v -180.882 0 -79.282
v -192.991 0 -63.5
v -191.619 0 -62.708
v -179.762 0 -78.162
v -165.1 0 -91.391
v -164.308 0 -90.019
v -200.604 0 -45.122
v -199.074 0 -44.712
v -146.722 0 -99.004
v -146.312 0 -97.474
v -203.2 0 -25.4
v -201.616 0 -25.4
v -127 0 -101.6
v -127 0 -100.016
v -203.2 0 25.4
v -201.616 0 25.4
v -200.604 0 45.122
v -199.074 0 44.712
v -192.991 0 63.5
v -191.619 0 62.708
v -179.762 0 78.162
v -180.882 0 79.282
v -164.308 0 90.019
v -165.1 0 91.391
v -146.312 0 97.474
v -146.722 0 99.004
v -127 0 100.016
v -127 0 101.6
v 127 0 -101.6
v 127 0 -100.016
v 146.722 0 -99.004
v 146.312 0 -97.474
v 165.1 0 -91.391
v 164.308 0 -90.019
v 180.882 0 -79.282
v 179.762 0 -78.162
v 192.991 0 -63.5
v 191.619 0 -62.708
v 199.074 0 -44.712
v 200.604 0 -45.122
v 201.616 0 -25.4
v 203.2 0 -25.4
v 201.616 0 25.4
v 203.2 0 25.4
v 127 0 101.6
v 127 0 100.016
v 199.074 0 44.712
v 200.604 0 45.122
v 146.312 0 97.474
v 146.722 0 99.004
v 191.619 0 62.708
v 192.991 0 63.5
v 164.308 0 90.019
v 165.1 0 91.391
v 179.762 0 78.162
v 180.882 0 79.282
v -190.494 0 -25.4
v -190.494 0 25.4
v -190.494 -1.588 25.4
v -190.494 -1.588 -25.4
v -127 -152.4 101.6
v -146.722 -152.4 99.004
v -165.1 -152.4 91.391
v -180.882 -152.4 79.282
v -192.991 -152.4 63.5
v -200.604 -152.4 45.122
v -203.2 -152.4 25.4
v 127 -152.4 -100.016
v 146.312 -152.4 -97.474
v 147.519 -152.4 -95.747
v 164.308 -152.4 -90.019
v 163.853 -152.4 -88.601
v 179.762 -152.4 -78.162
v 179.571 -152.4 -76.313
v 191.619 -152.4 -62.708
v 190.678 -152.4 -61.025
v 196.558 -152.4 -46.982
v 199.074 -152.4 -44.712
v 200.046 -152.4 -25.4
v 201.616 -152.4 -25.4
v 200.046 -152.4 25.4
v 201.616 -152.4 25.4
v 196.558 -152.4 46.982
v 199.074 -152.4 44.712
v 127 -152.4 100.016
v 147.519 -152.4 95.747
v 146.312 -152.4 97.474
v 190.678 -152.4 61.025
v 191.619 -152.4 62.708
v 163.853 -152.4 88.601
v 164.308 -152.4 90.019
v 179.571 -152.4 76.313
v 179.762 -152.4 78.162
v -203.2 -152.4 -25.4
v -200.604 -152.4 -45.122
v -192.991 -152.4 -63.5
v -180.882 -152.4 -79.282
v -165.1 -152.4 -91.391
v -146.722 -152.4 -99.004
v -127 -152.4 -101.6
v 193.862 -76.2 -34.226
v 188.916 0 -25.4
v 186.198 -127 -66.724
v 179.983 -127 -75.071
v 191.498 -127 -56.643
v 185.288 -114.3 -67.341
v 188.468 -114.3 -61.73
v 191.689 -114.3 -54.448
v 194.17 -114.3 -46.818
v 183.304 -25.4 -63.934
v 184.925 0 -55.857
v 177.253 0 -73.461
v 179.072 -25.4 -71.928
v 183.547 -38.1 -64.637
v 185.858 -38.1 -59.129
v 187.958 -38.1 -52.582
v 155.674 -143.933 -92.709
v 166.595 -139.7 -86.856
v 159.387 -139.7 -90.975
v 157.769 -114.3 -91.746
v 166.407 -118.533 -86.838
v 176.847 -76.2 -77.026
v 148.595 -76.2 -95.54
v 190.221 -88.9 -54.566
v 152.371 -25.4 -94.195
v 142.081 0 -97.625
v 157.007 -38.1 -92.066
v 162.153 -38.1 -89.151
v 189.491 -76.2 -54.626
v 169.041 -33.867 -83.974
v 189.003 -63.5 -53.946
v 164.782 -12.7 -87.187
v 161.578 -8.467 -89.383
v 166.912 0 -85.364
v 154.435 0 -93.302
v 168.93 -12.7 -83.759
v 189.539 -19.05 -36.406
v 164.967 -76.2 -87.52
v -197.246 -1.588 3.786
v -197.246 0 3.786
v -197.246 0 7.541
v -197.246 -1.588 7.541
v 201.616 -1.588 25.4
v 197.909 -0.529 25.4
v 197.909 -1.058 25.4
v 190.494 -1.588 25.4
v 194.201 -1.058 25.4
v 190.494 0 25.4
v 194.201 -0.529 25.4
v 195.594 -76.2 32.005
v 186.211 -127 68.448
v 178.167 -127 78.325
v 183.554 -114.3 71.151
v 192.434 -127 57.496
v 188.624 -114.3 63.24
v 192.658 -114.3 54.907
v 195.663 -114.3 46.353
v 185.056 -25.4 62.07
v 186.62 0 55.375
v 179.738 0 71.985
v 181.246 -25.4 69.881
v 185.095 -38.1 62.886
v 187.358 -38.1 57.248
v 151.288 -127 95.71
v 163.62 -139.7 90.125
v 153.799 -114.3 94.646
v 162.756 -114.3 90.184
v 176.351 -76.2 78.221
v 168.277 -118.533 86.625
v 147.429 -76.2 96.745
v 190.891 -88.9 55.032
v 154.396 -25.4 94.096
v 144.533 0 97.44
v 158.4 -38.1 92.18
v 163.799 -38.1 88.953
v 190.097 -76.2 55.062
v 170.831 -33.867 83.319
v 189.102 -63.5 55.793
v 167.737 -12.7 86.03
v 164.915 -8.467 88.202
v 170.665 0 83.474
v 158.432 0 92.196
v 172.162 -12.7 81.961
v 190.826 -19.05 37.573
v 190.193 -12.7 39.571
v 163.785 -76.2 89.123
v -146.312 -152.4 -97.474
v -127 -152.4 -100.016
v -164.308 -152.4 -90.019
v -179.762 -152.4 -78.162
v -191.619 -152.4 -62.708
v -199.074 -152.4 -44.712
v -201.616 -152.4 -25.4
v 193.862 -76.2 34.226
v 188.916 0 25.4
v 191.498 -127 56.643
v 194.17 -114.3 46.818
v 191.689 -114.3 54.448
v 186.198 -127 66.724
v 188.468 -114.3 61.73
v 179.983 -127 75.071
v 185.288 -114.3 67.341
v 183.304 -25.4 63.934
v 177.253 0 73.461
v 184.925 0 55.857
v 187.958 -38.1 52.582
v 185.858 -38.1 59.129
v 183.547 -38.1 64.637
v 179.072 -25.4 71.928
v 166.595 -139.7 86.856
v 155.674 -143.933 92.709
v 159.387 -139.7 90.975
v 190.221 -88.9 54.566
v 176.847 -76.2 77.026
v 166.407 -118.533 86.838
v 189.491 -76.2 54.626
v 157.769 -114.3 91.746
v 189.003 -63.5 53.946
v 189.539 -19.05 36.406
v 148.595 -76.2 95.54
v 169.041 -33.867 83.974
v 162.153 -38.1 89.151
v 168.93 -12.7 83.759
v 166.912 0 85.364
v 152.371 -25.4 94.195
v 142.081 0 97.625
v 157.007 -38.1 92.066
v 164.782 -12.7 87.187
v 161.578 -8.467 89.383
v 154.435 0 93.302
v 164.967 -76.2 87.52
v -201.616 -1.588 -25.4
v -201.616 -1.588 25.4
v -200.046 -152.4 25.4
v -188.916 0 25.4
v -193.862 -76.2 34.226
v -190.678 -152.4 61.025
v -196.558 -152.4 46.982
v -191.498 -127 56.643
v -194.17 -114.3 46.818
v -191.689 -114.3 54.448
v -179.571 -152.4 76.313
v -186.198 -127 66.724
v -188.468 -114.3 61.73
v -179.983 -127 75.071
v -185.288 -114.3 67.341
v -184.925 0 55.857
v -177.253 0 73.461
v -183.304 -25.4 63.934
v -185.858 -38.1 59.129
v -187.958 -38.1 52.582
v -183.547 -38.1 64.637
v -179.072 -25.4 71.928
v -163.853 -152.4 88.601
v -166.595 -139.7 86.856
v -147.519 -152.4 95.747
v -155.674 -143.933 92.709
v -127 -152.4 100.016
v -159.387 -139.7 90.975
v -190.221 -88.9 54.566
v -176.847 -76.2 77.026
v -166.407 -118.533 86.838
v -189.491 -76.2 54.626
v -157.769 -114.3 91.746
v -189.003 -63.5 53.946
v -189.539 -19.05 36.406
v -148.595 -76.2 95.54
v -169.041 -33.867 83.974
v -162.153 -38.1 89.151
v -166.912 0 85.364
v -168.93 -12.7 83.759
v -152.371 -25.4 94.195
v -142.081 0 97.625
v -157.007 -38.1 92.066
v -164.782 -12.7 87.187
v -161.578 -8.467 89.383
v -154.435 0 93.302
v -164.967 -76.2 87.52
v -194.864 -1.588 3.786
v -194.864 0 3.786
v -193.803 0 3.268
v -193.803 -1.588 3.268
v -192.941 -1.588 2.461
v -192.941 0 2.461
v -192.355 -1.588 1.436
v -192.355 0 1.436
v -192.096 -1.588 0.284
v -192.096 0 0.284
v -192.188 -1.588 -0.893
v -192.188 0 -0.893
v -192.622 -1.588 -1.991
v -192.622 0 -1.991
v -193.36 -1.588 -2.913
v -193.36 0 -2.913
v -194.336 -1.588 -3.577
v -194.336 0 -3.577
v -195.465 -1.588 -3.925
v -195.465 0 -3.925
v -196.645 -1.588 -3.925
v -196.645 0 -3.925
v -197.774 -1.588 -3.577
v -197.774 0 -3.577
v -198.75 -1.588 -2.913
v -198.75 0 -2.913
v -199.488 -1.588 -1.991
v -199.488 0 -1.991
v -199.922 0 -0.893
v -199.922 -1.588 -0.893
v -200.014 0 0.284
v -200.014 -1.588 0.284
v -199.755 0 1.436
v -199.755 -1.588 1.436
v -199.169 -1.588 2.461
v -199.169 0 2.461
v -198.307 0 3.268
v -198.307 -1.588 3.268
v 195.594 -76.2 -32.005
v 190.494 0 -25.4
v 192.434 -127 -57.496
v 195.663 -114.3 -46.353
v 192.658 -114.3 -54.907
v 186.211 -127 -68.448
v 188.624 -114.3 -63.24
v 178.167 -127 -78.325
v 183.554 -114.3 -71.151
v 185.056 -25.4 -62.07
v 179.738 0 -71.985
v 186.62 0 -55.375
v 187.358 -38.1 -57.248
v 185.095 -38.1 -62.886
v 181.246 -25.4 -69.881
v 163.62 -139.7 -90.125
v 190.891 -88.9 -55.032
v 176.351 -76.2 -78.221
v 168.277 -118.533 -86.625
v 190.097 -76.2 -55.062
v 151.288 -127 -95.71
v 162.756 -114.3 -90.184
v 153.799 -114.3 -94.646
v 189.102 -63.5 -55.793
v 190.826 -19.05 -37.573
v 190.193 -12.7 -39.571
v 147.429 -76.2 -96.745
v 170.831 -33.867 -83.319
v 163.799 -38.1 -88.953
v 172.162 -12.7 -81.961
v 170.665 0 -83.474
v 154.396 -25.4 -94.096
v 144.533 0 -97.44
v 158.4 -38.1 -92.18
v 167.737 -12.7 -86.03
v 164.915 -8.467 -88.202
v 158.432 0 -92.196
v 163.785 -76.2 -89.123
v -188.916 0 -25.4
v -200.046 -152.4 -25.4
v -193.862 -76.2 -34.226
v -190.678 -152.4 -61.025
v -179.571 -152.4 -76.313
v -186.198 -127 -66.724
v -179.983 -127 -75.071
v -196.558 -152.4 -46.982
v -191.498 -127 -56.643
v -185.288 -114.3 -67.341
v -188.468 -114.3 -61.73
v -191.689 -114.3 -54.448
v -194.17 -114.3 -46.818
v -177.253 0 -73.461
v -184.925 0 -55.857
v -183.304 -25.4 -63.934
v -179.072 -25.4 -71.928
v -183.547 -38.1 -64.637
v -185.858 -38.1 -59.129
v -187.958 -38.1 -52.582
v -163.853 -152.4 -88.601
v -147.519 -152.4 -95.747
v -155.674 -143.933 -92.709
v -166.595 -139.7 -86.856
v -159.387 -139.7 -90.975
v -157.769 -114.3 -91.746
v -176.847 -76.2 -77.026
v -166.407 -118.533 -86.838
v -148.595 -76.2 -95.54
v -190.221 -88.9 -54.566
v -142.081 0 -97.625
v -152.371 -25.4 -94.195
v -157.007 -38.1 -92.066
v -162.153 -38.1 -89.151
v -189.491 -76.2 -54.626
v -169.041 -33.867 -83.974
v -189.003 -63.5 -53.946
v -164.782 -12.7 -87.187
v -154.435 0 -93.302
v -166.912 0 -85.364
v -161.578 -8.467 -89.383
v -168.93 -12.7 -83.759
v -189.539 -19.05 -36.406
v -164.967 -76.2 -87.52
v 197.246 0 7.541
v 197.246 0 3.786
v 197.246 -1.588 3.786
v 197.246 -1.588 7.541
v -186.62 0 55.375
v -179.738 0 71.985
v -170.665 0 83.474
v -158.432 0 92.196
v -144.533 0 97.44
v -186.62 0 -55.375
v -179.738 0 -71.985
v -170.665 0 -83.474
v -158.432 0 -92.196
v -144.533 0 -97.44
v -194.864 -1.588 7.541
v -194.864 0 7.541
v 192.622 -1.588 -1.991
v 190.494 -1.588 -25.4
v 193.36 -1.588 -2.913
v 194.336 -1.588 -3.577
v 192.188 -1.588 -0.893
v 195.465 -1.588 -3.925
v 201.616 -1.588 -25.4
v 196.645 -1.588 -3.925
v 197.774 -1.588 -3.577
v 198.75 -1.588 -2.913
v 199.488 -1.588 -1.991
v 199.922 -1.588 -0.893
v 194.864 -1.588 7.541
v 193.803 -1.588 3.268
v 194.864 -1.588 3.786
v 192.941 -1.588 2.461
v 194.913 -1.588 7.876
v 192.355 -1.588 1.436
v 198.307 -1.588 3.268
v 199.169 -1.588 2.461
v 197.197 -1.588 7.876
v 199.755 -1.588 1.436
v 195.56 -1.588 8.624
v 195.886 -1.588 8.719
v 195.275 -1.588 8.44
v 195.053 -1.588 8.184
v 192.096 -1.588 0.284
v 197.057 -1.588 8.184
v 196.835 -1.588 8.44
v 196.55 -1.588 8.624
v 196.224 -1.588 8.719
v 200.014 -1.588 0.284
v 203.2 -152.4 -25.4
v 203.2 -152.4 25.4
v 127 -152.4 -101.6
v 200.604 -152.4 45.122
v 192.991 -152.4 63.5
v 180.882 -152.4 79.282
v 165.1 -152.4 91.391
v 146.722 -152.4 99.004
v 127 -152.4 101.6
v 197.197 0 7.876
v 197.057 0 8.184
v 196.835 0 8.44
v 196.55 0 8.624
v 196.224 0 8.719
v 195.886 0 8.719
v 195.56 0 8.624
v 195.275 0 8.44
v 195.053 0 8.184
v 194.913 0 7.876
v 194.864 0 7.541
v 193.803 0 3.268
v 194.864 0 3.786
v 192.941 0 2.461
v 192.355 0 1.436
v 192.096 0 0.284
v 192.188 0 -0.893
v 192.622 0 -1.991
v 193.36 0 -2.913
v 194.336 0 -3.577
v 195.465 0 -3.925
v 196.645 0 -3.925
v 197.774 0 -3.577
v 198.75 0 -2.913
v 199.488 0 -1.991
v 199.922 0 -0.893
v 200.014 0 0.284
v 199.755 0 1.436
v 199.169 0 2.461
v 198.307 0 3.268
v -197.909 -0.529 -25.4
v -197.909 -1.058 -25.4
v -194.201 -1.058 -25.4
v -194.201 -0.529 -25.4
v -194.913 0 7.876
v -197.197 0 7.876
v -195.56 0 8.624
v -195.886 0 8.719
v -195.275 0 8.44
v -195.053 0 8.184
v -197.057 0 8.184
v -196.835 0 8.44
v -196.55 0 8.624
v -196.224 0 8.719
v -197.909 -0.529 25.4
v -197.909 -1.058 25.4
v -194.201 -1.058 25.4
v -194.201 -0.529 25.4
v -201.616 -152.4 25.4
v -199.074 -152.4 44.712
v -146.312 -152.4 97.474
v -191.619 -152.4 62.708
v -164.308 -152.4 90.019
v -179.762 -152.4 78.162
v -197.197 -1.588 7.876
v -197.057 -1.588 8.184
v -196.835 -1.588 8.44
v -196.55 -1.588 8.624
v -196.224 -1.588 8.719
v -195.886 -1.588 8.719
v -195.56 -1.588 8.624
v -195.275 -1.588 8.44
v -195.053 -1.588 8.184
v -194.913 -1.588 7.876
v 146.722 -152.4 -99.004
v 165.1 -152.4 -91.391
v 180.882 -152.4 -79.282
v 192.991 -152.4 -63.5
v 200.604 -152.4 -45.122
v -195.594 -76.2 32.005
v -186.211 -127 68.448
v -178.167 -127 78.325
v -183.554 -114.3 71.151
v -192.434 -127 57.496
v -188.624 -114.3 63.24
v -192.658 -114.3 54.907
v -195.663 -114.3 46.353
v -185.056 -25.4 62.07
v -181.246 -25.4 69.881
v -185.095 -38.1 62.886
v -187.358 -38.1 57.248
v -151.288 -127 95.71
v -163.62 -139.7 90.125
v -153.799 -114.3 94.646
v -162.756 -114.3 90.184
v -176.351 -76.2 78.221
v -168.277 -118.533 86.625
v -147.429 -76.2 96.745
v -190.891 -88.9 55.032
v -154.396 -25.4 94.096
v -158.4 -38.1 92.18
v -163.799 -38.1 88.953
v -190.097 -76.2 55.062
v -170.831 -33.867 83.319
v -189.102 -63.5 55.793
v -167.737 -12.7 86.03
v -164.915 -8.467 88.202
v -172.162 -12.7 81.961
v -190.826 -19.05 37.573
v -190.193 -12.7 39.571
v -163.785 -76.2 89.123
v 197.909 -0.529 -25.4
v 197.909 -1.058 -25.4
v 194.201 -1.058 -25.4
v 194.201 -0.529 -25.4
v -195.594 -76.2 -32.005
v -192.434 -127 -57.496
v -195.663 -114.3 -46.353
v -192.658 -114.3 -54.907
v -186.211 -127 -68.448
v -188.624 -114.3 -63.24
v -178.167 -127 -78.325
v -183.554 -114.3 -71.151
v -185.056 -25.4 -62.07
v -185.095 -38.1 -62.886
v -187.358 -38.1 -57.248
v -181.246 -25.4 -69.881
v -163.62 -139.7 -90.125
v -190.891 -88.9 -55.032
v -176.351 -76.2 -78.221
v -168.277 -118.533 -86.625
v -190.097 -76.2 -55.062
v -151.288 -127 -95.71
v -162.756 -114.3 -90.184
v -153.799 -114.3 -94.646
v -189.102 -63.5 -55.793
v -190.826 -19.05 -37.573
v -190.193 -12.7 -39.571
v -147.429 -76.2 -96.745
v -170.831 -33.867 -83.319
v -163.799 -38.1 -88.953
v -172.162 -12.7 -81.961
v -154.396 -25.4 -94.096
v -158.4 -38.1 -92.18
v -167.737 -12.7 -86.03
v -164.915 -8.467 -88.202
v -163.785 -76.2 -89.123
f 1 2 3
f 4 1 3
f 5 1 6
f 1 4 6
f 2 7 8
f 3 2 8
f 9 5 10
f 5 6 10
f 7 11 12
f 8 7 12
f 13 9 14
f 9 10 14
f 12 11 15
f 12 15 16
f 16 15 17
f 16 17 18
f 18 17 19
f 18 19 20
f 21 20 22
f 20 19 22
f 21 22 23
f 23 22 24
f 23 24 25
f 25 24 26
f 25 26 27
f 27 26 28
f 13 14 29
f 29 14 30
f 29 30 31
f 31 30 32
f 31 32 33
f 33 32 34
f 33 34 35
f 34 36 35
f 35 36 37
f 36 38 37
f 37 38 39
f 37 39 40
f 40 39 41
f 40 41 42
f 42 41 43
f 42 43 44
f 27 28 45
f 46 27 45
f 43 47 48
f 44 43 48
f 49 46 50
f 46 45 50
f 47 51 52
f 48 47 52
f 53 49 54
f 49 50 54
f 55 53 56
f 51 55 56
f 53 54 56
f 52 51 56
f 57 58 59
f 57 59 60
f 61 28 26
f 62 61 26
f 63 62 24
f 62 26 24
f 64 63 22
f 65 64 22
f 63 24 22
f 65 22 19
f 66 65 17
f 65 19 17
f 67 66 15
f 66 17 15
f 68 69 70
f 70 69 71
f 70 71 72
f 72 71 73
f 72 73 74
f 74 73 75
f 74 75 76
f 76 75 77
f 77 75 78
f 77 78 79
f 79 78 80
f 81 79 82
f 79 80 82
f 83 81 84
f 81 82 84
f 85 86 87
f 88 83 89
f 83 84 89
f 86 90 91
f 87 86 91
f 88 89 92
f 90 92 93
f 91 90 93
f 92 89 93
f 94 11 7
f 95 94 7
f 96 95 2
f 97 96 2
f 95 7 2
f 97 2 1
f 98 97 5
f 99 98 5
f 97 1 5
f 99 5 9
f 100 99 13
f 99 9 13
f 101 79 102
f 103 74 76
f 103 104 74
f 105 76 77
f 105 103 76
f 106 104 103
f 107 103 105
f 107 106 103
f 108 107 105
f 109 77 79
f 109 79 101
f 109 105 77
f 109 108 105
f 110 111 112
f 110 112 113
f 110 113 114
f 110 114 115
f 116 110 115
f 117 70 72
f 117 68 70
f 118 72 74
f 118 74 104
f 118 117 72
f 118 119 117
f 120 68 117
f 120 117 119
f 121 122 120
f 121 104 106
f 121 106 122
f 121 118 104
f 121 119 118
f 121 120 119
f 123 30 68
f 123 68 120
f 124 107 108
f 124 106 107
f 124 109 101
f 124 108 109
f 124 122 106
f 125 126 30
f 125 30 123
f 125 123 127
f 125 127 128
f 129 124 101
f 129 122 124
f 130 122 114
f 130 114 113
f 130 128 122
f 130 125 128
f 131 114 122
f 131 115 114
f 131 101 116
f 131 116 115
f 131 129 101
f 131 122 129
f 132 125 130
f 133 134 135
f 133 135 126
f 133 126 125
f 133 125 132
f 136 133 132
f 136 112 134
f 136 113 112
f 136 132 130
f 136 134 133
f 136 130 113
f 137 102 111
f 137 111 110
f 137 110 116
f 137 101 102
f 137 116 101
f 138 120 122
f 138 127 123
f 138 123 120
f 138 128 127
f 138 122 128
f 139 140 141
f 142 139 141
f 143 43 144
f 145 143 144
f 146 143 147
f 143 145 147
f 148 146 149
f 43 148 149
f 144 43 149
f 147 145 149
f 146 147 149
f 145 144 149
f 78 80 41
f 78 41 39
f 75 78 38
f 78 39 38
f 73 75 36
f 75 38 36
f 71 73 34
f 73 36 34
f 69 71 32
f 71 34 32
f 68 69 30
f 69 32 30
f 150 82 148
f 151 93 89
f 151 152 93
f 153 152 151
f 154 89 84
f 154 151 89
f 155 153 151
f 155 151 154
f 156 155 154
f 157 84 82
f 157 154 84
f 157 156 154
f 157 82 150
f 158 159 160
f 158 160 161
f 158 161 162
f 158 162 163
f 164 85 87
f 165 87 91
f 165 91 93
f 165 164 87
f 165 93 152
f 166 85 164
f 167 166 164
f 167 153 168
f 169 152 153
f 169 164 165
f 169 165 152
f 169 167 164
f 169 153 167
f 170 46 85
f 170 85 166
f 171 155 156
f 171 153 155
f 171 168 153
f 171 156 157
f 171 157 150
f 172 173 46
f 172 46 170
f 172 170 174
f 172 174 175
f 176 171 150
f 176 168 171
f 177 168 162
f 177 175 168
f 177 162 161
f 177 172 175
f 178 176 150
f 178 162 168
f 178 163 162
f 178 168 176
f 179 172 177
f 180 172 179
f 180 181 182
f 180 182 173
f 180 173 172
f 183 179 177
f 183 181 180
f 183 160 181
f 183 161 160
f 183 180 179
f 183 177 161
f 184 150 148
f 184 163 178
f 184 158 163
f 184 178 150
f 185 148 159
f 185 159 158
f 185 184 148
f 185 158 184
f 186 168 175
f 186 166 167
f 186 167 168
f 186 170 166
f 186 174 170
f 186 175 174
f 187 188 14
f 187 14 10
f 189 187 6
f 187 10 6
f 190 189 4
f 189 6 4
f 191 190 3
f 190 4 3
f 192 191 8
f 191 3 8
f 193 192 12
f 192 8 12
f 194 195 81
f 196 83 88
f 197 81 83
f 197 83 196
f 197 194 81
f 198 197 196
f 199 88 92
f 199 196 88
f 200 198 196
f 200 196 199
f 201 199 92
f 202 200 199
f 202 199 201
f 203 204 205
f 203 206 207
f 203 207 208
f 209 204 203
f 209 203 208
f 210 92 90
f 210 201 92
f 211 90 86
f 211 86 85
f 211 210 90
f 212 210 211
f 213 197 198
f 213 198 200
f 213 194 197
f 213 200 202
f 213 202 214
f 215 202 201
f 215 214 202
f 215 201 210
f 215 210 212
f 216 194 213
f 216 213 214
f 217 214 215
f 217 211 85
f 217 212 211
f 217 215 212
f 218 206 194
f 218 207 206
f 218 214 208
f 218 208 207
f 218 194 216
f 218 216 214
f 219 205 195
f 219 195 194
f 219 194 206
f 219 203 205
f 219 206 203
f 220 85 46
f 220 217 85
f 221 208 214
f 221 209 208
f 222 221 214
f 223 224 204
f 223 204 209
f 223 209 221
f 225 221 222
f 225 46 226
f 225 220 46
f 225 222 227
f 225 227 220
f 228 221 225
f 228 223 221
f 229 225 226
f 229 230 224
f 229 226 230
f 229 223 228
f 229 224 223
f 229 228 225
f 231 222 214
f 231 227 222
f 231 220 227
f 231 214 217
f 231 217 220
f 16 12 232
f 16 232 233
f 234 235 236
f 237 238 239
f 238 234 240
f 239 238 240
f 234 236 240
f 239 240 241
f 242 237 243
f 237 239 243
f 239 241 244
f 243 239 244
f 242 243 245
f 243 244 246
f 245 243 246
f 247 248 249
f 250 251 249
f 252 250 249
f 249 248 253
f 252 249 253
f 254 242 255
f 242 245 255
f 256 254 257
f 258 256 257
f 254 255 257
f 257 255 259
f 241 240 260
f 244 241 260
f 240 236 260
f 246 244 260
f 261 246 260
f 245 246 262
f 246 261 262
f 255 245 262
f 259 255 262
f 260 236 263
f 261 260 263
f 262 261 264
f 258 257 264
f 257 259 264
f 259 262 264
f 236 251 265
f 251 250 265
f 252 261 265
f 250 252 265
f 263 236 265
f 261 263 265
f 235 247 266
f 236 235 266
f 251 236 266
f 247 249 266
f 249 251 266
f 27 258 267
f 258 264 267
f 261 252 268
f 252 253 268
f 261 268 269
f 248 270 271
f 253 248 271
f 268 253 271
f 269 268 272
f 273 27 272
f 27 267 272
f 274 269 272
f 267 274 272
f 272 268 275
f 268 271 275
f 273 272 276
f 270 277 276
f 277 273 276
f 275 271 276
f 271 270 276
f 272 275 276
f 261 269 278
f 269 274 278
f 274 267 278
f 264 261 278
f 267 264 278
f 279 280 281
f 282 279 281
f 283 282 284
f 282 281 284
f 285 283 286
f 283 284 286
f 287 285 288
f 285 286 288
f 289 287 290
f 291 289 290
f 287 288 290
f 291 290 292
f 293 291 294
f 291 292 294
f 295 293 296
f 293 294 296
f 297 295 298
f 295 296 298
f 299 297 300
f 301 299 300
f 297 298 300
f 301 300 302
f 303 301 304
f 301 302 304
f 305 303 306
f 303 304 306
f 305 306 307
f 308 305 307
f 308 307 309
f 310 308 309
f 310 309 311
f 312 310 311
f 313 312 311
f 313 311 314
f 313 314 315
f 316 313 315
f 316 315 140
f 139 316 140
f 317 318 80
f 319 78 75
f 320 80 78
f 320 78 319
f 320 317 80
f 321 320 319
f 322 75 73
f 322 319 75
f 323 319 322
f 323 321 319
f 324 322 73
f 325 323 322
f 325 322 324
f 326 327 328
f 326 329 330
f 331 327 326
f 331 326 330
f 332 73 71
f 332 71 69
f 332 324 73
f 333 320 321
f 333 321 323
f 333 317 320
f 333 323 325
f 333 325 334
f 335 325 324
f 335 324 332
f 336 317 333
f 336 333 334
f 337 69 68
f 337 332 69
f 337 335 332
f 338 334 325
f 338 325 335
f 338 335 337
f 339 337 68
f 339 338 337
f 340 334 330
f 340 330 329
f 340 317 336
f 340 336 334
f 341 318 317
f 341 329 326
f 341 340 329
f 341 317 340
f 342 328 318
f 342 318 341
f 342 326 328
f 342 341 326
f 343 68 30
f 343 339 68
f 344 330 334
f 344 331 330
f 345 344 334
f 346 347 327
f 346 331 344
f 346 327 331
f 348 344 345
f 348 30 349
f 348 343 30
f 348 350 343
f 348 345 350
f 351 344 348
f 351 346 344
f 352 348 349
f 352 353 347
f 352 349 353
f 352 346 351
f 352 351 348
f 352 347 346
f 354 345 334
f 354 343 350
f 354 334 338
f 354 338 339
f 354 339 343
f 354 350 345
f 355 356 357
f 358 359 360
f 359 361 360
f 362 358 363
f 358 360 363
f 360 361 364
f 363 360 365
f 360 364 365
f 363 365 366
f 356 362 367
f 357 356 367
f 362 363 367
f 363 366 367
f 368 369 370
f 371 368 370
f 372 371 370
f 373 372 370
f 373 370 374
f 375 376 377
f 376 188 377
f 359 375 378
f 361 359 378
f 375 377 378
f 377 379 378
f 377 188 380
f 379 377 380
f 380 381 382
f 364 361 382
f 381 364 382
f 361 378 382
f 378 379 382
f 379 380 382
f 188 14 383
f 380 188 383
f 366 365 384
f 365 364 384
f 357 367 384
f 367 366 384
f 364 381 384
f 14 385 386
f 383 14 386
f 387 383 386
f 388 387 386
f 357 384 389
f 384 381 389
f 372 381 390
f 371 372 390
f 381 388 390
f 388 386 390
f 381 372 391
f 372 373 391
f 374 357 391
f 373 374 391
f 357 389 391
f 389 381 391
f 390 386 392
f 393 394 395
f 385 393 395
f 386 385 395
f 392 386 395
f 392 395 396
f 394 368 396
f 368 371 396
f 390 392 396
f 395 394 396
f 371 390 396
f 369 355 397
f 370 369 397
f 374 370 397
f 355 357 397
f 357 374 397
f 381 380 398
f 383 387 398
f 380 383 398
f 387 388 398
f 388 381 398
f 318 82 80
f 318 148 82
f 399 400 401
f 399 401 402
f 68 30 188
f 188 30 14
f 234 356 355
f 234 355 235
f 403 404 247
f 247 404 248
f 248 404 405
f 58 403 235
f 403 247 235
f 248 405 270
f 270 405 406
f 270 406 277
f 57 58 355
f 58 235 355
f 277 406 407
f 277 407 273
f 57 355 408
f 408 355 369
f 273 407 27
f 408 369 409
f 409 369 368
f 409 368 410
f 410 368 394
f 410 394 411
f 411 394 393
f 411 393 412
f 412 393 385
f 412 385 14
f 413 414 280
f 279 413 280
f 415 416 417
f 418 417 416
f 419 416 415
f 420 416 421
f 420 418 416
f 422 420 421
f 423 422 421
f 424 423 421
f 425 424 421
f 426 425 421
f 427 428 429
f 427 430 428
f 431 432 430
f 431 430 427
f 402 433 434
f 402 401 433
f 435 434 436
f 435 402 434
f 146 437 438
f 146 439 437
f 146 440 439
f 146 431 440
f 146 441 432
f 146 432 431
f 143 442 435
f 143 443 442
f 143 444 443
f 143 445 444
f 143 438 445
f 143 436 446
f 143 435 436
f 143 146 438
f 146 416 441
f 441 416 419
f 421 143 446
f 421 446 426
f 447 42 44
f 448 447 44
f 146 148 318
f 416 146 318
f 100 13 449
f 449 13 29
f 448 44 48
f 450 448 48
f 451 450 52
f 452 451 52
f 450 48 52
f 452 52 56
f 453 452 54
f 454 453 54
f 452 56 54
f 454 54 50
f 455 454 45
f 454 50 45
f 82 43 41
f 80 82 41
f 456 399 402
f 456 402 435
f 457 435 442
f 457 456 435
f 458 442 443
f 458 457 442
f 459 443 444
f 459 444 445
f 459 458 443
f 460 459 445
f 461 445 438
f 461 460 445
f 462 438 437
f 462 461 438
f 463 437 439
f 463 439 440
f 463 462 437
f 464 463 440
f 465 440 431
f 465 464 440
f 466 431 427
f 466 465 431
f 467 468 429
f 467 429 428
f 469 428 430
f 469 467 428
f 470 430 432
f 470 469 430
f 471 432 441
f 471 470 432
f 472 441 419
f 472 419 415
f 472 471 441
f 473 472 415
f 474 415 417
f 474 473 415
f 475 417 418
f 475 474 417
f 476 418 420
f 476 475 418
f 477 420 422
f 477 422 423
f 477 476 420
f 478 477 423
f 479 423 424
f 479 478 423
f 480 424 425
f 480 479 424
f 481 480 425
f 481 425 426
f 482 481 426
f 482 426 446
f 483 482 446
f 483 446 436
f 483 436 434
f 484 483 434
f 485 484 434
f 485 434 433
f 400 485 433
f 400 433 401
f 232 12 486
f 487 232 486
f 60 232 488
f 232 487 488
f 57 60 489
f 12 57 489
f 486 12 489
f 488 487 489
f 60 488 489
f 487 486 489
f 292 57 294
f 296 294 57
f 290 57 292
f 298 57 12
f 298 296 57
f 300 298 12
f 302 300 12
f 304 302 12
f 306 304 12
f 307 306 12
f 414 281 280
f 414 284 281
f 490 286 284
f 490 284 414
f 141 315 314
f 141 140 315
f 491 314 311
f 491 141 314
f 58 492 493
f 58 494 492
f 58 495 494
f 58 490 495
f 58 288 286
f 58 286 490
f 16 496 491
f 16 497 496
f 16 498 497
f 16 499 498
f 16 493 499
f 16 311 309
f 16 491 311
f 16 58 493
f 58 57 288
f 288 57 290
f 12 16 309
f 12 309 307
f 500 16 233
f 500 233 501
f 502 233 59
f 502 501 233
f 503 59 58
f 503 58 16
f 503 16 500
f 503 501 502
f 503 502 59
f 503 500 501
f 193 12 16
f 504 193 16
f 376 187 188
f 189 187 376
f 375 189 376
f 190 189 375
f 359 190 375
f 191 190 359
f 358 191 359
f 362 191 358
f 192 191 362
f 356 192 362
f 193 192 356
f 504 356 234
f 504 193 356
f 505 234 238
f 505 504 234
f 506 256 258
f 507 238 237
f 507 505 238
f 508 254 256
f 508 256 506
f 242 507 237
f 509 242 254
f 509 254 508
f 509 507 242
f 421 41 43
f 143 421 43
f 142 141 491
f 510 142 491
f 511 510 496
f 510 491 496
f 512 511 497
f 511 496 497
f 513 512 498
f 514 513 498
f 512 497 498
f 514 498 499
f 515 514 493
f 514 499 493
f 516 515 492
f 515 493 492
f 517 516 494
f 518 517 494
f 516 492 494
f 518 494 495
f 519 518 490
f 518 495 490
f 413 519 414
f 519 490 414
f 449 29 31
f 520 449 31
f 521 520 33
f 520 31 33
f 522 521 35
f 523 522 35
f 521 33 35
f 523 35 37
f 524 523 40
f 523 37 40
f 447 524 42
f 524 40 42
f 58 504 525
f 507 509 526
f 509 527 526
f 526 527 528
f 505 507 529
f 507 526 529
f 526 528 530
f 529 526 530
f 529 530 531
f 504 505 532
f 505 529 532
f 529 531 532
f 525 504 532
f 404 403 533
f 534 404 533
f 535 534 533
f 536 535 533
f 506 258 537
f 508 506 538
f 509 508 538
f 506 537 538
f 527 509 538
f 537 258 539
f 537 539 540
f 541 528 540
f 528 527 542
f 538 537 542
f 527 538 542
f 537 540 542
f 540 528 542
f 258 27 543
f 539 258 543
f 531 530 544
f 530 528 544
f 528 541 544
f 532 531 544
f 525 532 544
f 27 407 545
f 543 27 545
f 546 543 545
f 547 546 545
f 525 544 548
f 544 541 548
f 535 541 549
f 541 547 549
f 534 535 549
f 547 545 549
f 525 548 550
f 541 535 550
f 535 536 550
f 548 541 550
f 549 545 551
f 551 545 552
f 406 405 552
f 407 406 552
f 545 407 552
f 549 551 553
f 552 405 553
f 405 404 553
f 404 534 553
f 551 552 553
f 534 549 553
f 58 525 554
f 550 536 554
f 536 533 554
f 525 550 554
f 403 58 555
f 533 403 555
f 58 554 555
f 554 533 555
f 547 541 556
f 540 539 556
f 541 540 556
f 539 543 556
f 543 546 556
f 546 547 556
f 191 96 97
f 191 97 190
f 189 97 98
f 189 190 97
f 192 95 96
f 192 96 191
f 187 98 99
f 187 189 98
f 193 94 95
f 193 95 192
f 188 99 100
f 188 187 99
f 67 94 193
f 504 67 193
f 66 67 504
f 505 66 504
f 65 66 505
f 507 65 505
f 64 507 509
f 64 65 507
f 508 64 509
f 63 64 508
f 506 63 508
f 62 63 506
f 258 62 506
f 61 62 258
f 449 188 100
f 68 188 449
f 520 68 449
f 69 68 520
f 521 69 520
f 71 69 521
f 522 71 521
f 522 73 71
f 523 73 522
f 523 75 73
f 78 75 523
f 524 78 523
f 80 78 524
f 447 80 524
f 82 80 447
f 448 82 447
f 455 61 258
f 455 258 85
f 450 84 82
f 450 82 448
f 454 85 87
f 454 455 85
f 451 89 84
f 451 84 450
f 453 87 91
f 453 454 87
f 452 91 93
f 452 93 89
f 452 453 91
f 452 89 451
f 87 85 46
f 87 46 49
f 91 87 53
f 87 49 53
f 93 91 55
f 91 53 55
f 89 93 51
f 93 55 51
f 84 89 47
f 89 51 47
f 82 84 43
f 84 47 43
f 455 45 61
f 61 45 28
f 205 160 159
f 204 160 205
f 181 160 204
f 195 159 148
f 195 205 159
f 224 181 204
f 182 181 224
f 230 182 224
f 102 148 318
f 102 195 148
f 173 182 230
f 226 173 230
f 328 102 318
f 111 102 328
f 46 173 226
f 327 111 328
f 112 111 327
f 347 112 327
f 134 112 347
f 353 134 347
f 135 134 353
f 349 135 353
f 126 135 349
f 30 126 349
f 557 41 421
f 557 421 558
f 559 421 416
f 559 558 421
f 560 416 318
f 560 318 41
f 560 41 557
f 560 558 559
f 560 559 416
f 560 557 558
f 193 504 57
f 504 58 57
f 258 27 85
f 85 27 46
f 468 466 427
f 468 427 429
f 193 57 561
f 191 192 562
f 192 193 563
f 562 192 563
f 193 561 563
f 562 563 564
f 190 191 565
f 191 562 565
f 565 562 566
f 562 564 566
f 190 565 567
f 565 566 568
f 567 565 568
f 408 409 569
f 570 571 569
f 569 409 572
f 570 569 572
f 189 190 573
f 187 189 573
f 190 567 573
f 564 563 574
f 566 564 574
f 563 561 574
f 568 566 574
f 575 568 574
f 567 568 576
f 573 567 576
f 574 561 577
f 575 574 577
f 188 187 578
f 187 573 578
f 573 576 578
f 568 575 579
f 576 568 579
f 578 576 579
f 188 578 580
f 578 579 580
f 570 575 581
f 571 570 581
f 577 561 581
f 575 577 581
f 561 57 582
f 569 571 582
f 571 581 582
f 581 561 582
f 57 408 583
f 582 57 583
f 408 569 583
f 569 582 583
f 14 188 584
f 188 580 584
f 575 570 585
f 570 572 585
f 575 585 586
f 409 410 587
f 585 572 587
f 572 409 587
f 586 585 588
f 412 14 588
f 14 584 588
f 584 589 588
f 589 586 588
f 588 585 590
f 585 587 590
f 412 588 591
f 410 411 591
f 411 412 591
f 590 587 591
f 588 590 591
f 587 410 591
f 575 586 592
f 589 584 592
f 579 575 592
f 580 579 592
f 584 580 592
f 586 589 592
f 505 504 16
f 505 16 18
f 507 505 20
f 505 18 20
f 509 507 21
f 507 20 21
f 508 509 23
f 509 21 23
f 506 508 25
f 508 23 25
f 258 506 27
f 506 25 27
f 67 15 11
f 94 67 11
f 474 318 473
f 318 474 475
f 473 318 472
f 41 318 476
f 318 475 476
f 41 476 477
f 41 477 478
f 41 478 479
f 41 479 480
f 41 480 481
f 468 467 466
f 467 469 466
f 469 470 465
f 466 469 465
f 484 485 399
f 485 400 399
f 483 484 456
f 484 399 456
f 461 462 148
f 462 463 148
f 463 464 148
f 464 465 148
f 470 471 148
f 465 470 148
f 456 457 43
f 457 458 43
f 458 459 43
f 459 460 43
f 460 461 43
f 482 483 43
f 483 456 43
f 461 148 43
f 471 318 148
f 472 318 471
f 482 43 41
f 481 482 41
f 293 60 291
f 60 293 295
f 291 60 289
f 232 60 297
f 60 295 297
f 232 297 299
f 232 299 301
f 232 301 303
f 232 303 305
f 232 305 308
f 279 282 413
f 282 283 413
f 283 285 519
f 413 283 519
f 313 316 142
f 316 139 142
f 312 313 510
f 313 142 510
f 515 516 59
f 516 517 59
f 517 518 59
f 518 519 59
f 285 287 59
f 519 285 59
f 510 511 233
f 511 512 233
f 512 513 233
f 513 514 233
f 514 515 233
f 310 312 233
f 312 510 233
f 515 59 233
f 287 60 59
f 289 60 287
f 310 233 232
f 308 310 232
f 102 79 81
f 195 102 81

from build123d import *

# Parameters (mm, degrees)
F1_DEPTH = 152.4
F7_DEPTH = 1.5875
F9_DEPTH = 1.6002


# Not quite as in the source:
# - ends of sketch curves that miss each other by under 0.0002 mm in the source are joined


with BuildPart() as f1:
    # F0 (on Front) → F1 (new body)
    with BuildSketch(Plane.XZ):
        with BuildLine():
            Line((-127, -101.6), (127, -101.6))
            ThreePointArc((127, -101.6), (180.8815367264, -79.2815367264), (203.2, -25.4))
            Line((203.2, -25.4), (203.2, 25.4))
            ThreePointArc((203.2, 25.4), (180.8815367264, 79.2815367264), (127, 101.6))
            Line((127, 101.6), (-127, 101.6))
            ThreePointArc((-127, 101.6), (-180.8815367264, 79.2815367264), (-203.2, 25.4))
            Line((-203.2, 25.4), (-203.2, -25.4))
            ThreePointArc((-203.2, -25.4), (-180.8815367264, -79.2815367264), (-127, -101.6))
        make_face()
        with BuildLine():
            ThreePointArc((127, 100.0160425901), (179.7615097008, 78.1615097008), (201.6160425901, 25.4))
            Line((201.6160425901, 25.4), (201.6160425901, -25.4))
            ThreePointArc((201.6160425901, -25.4), (179.7615097008, -78.1615097008), (127, -100.0160425901))
            Line((127, -100.0160425901), (-127, -100.0160425901))
            ThreePointArc((-127, -100.0160425901), (-179.7615097008, -78.1615097008), (-201.6160425901, -25.4))
            Line((-201.6160425901, -25.4), (-201.6160425901, 25.4))
            ThreePointArc((-201.6160425901, 25.4), (-179.7615097008, 78.1615097008), (-127, 100.0160425901))
            Line((-127, 100.0160425901), (127, 100.0160425901))
        make_face(mode=Mode.SUBTRACT)
    extrude(amount=F1_DEPTH)


with BuildPart() as f4:
    # F2 (on face) → F4 section 0
    with BuildSketch(Plane.XZ.offset(152.4)):
        with BuildLine():
            add(Edge.make_bspline(
                [(-200.0462481144, 25.3999990709), (-200.1293383282, 40.9304278155), (-191.8294578791, 92.6911234856), (-127, 100.0160425901)],
                knots=[0, 0, 0, 0, 104.4189078379, 104.4189078379, 104.4189078379, 104.4189078379], degree=3))
            ThreePointArc((-127, 100.0160425901), (-179.7615097008, 78.1615097008), (-201.6160425901, 25.4))
            Line((-201.6160425901, 25.4), (-201.6160425901, -25.4))
            ThreePointArc((-201.6160425901, -25.4), (-179.7615097008, -78.1615097008), (-127, -100.0160425901))
            add(Edge.make_bspline(
                [(-200.0462481144, -25.3999990709), (-200.1293383282, -40.9304278155), (-191.8294578791, -92.6911234856), (-127, -100.0160425901)],
                knots=[0, 0, 0, 0, 104.4189078379, 104.4189078379, 104.4189078379, 104.4189078379], degree=3))
            Line((-200.0462481144, -25.3999990709), (-200.0462481144, 25.3999990709))
        make_face()
    # F3 (on face) → F4 section 1
    with BuildSketch(Plane(origin=(0, 0, 0), x_dir=(-1, 0, 0), z_dir=(0, 1, 0))):
        with BuildLine():
            Line((188.9160425901, 25.4), (188.9160425901, -25.4))
            add(Edge.make_bspline(
                [(188.9160425901, -25.4), (187.5226431005, -38.4616232589), (190.9089535475, -94.981238246), (127, -100.0160425901)],
                knots=[0, 0, 0, 0, 96.9595283705, 96.9595283705, 96.9595283705, 96.9595283705], degree=3))
            add(Edge.make_bspline(
                [(190.4939562082, -25.4), (189.0110522509, -35.2551564574), (193.8259601593, -96.4445024729), (127, -100.0160425901)],
                knots=[0, 0, 0, 0, 97.9746716595, 97.9746716595, 97.9746716595, 97.9746716595], degree=3))
            Line((190.4939562082, -25.4), (190.4939562082, 25.4))
            add(Edge.make_bspline(
                [(190.4939562082, 25.4), (189.0110522509, 35.2551564574), (193.8259601593, 96.4445024729), (127, 100.0160425901)],
                knots=[0, 0, 0, 0, 97.9746716595, 97.9746716595, 97.9746716595, 97.9746716595], degree=3))
            add(Edge.make_bspline(
                [(188.9160425901, 25.4), (187.5226431005, 38.4616232589), (190.9089535475, 94.981238246), (127, 100.0160425901)],
                knots=[0, 0, 0, 0, 96.9595283705, 96.9595283705, 96.9595283705, 96.9595283705], degree=3))
        make_face()
    loft()


with BuildPart() as f7:
    # F6 (on face) → F7 (new body)
    with BuildSketch(Plane(origin=(0, 0, 0), x_dir=(-1, 0, 0), z_dir=(0, 1, 0))):
        with BuildLine():
            Line((190.4939562082, 25.4), (190.4939562082, -25.4))
            add(Edge.make_bspline(
                [(201.6160425901, -25.4), (197.9086804628, -25.4), (194.2013183355, -25.4), (190.4939562082, -25.4)],
                knots=[0, 0, 0, 0, 1, 1, 1, 1], degree=3))
            Line((201.6160425901, -25.4), (201.6160425901, 25.4))
            add(Edge.make_bspline(
                [(201.6160425901, 25.4), (197.9086804628, 25.4), (194.2013183355, 25.4), (190.4939562082, 25.4)],
                knots=[0, 0, 0, 0, 1, 1, 1, 1], degree=3))
        make_face()
    extrude(amount=-F7_DEPTH)

    # F8 (on face) → F9 (cut)
    with BuildSketch(Plane(origin=(0, 0, 0), x_dir=(-1, 0, 0), z_dir=(0, 1, 0))):
        with BuildLine():
            Line((194.8643743992, 7.540625), (194.8643743992, 3.7859462056))
            ThreePointArc((194.8643743992, 3.7859462056), (196.0549993992, -3.96875), (197.2456243992, 3.7859462056))
            Line((197.2456243992, 3.7859462056), (197.2456243992, 7.540625))
            ThreePointArc((197.2456243992, 7.540625), (196.0549993992, 8.73125), (194.8643743992, 7.540625))
        make_face()
    extrude(amount=-F9_DEPTH, mode=Mode.SUBTRACT)


with BuildPart() as f10_1:
    # F10: instance of F7
    add(f7.part.mirror(Plane.YZ))


with BuildPart() as f10_2:
    # F10: instance of F4
    add(f4.part.mirror(Plane.YZ))


solid = Compound([f1.part, f4.part, f7.part, f10_1.part, f10_2.part])
